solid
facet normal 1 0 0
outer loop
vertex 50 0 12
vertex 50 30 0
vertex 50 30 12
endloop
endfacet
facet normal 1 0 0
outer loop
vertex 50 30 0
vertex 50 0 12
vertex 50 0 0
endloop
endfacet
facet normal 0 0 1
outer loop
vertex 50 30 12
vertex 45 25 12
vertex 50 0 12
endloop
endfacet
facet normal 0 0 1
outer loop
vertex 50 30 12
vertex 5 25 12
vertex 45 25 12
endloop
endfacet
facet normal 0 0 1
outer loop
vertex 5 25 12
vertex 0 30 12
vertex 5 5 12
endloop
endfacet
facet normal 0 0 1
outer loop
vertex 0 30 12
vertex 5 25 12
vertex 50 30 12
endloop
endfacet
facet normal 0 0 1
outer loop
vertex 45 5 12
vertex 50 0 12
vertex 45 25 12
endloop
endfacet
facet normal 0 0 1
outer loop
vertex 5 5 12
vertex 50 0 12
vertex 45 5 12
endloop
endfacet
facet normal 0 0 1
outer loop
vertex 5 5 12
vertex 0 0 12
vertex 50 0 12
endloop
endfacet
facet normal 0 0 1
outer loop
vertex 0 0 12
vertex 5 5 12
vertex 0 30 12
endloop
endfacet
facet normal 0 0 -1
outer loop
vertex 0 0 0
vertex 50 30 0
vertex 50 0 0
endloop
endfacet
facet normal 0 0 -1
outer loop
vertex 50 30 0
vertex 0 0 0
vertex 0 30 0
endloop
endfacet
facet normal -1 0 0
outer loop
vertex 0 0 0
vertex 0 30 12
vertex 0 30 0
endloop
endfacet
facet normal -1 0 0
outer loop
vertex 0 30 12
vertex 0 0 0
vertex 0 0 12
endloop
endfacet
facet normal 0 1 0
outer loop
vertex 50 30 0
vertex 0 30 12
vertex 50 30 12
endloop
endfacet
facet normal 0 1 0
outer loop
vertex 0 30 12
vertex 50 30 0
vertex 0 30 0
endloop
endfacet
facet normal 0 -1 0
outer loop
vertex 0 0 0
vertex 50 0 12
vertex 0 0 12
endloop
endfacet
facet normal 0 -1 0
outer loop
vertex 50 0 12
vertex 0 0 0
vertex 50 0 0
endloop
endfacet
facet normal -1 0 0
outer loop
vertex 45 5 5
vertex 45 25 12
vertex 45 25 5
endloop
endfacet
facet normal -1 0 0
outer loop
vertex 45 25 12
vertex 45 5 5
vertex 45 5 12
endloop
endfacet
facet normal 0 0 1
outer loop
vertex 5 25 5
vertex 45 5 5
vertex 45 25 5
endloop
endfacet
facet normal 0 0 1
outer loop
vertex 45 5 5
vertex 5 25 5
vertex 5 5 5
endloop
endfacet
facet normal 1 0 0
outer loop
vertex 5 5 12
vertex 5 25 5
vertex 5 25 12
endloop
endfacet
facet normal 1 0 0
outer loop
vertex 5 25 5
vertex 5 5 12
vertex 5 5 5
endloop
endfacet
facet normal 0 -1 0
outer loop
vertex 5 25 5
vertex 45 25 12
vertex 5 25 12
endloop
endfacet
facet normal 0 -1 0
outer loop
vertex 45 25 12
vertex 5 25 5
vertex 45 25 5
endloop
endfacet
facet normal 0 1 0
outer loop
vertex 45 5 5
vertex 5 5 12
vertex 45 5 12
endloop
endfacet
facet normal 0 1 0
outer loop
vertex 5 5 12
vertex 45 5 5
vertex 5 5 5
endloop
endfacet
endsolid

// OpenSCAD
// Wrong cavity depth and outer height (12 mm instead of 20 mm).
difference() {
  cube([50, 30, 12]);
  translate([5, 5, 5]) cube([40, 20, 12]);
}
